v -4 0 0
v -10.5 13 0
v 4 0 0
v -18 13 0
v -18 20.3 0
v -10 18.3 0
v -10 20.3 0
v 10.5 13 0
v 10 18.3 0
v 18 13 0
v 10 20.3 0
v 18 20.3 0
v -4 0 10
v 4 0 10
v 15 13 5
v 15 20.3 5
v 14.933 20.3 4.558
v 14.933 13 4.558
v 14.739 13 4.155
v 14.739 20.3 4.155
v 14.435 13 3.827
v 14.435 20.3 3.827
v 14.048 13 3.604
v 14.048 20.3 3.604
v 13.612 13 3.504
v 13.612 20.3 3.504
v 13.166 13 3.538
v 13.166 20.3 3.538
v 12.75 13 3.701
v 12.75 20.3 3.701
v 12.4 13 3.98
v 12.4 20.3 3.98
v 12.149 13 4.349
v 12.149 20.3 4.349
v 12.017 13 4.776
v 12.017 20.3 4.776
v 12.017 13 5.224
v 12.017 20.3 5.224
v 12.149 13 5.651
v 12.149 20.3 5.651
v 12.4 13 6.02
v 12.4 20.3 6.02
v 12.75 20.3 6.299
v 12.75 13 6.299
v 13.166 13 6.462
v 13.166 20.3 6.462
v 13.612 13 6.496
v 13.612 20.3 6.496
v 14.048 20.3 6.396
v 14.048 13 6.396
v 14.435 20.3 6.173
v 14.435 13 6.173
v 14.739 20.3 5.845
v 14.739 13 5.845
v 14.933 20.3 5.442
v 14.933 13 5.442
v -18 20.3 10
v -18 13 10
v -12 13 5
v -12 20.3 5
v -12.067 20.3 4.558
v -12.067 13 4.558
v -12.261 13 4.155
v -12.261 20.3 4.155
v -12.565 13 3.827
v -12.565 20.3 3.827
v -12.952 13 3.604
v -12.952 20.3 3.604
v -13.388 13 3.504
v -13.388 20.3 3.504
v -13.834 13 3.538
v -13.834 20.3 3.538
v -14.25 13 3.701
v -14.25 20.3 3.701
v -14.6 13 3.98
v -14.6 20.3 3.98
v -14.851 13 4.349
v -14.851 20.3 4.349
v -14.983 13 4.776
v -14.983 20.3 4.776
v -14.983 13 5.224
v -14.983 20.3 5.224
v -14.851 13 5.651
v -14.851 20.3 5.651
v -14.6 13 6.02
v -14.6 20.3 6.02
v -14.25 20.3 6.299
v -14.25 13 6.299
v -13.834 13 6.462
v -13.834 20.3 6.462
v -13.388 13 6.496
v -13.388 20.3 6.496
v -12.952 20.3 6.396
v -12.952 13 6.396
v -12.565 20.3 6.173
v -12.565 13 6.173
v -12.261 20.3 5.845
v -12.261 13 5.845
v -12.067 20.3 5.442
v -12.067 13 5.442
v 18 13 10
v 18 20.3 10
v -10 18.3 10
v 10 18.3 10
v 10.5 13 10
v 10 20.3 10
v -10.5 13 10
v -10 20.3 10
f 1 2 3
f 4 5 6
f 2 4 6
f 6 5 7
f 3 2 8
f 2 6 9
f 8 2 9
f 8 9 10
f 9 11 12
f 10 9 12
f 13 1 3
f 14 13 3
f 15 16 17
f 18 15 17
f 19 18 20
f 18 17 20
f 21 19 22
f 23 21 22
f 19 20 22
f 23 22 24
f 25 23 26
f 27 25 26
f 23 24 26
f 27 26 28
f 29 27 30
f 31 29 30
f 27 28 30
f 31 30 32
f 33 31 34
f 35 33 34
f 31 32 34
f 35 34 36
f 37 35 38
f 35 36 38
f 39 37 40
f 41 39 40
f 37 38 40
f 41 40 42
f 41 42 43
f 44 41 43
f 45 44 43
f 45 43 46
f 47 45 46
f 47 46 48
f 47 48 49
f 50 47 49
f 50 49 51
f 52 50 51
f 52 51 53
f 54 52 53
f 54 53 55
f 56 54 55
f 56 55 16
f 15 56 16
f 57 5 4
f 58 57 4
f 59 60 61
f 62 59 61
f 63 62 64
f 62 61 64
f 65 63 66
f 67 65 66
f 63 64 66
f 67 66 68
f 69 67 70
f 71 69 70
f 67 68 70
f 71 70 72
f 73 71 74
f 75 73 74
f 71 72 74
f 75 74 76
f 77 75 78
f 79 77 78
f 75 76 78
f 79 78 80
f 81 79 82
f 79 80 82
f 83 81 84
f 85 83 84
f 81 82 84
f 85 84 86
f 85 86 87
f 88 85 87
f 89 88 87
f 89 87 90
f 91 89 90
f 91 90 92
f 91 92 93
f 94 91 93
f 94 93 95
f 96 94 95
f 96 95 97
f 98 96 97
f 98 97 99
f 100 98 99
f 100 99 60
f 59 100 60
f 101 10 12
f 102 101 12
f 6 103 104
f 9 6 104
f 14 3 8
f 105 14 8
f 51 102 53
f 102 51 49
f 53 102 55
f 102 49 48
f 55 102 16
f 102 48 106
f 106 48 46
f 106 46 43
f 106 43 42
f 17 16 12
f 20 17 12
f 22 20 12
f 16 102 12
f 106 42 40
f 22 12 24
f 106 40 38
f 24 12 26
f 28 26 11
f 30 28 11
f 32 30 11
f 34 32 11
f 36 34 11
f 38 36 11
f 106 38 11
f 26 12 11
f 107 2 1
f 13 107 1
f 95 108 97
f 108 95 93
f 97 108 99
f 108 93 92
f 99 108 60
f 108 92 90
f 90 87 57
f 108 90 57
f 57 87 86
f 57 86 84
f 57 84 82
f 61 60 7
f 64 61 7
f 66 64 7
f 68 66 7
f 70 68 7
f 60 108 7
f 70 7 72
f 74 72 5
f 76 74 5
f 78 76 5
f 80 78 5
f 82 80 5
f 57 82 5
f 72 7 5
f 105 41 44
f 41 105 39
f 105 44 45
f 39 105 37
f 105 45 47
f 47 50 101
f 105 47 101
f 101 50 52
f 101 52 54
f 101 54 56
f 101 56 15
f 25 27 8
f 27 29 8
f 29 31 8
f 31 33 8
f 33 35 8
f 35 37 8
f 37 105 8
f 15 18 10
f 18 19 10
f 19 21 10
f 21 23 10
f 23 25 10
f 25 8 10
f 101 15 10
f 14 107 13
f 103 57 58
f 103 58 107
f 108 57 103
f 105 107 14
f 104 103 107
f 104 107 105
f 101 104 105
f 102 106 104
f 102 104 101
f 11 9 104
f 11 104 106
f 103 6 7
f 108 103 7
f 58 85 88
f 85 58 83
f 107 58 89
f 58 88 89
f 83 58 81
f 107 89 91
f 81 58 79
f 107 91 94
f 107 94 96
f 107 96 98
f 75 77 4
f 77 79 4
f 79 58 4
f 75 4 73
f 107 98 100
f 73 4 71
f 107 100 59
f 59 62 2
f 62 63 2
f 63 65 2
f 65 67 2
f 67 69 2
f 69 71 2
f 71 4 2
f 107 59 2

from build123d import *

# Parameters (mm, degrees)
BOSS_EXTRUDE1_DEPTH     = 10
SKETCH2_W               = 20
SKETCH2_H               = 2
CUT_EXTRUDE1_DEPTH      = 11
SKETCH3_R               = 1.5
CUT_EXTRUDE2_DEPTH      = 1
CUT_EXTRUDE2_DEPTH_BACK = 21.3


with BuildPart() as part:
    # Sketch1 → Boss-Extrude1 (new body)
    with BuildSketch(Plane.XY):
        Polygon((-4, 0), (4, 0), (10.5, 13), (18, 13), (18, 20.3), (-18, 20.3), (-18, 13), (-10.5, 13), align=None)
    extrude(amount=BOSS_EXTRUDE1_DEPTH)

    # Sketch2 → Cut-Extrude1 (cut, through all)
    with BuildSketch(Plane.XY.offset(10)):
        with Locations((0, 19.3)):
            Rectangle(SKETCH2_W, SKETCH2_H)
    extrude(amount=-CUT_EXTRUDE1_DEPTH, mode=Mode.SUBTRACT)

    # Sketch3 → Cut-Extrude2 (cut, two sides)
    with BuildSketch(Plane(origin=(0, 20.3, 0), x_dir=(1, 0, 0), z_dir=(0, 1, 0))) as cut_extrude2_sk:
        with Locations((-13.5, -5)):
            Circle(SKETCH3_R)
        with Locations((13.5, -5)):
            Circle(SKETCH3_R)
    extrude(amount=CUT_EXTRUDE2_DEPTH, mode=Mode.SUBTRACT)
    extrude(cut_extrude2_sk.sketch, amount=-CUT_EXTRUDE2_DEPTH_BACK, mode=Mode.SUBTRACT)


solid = part.part
